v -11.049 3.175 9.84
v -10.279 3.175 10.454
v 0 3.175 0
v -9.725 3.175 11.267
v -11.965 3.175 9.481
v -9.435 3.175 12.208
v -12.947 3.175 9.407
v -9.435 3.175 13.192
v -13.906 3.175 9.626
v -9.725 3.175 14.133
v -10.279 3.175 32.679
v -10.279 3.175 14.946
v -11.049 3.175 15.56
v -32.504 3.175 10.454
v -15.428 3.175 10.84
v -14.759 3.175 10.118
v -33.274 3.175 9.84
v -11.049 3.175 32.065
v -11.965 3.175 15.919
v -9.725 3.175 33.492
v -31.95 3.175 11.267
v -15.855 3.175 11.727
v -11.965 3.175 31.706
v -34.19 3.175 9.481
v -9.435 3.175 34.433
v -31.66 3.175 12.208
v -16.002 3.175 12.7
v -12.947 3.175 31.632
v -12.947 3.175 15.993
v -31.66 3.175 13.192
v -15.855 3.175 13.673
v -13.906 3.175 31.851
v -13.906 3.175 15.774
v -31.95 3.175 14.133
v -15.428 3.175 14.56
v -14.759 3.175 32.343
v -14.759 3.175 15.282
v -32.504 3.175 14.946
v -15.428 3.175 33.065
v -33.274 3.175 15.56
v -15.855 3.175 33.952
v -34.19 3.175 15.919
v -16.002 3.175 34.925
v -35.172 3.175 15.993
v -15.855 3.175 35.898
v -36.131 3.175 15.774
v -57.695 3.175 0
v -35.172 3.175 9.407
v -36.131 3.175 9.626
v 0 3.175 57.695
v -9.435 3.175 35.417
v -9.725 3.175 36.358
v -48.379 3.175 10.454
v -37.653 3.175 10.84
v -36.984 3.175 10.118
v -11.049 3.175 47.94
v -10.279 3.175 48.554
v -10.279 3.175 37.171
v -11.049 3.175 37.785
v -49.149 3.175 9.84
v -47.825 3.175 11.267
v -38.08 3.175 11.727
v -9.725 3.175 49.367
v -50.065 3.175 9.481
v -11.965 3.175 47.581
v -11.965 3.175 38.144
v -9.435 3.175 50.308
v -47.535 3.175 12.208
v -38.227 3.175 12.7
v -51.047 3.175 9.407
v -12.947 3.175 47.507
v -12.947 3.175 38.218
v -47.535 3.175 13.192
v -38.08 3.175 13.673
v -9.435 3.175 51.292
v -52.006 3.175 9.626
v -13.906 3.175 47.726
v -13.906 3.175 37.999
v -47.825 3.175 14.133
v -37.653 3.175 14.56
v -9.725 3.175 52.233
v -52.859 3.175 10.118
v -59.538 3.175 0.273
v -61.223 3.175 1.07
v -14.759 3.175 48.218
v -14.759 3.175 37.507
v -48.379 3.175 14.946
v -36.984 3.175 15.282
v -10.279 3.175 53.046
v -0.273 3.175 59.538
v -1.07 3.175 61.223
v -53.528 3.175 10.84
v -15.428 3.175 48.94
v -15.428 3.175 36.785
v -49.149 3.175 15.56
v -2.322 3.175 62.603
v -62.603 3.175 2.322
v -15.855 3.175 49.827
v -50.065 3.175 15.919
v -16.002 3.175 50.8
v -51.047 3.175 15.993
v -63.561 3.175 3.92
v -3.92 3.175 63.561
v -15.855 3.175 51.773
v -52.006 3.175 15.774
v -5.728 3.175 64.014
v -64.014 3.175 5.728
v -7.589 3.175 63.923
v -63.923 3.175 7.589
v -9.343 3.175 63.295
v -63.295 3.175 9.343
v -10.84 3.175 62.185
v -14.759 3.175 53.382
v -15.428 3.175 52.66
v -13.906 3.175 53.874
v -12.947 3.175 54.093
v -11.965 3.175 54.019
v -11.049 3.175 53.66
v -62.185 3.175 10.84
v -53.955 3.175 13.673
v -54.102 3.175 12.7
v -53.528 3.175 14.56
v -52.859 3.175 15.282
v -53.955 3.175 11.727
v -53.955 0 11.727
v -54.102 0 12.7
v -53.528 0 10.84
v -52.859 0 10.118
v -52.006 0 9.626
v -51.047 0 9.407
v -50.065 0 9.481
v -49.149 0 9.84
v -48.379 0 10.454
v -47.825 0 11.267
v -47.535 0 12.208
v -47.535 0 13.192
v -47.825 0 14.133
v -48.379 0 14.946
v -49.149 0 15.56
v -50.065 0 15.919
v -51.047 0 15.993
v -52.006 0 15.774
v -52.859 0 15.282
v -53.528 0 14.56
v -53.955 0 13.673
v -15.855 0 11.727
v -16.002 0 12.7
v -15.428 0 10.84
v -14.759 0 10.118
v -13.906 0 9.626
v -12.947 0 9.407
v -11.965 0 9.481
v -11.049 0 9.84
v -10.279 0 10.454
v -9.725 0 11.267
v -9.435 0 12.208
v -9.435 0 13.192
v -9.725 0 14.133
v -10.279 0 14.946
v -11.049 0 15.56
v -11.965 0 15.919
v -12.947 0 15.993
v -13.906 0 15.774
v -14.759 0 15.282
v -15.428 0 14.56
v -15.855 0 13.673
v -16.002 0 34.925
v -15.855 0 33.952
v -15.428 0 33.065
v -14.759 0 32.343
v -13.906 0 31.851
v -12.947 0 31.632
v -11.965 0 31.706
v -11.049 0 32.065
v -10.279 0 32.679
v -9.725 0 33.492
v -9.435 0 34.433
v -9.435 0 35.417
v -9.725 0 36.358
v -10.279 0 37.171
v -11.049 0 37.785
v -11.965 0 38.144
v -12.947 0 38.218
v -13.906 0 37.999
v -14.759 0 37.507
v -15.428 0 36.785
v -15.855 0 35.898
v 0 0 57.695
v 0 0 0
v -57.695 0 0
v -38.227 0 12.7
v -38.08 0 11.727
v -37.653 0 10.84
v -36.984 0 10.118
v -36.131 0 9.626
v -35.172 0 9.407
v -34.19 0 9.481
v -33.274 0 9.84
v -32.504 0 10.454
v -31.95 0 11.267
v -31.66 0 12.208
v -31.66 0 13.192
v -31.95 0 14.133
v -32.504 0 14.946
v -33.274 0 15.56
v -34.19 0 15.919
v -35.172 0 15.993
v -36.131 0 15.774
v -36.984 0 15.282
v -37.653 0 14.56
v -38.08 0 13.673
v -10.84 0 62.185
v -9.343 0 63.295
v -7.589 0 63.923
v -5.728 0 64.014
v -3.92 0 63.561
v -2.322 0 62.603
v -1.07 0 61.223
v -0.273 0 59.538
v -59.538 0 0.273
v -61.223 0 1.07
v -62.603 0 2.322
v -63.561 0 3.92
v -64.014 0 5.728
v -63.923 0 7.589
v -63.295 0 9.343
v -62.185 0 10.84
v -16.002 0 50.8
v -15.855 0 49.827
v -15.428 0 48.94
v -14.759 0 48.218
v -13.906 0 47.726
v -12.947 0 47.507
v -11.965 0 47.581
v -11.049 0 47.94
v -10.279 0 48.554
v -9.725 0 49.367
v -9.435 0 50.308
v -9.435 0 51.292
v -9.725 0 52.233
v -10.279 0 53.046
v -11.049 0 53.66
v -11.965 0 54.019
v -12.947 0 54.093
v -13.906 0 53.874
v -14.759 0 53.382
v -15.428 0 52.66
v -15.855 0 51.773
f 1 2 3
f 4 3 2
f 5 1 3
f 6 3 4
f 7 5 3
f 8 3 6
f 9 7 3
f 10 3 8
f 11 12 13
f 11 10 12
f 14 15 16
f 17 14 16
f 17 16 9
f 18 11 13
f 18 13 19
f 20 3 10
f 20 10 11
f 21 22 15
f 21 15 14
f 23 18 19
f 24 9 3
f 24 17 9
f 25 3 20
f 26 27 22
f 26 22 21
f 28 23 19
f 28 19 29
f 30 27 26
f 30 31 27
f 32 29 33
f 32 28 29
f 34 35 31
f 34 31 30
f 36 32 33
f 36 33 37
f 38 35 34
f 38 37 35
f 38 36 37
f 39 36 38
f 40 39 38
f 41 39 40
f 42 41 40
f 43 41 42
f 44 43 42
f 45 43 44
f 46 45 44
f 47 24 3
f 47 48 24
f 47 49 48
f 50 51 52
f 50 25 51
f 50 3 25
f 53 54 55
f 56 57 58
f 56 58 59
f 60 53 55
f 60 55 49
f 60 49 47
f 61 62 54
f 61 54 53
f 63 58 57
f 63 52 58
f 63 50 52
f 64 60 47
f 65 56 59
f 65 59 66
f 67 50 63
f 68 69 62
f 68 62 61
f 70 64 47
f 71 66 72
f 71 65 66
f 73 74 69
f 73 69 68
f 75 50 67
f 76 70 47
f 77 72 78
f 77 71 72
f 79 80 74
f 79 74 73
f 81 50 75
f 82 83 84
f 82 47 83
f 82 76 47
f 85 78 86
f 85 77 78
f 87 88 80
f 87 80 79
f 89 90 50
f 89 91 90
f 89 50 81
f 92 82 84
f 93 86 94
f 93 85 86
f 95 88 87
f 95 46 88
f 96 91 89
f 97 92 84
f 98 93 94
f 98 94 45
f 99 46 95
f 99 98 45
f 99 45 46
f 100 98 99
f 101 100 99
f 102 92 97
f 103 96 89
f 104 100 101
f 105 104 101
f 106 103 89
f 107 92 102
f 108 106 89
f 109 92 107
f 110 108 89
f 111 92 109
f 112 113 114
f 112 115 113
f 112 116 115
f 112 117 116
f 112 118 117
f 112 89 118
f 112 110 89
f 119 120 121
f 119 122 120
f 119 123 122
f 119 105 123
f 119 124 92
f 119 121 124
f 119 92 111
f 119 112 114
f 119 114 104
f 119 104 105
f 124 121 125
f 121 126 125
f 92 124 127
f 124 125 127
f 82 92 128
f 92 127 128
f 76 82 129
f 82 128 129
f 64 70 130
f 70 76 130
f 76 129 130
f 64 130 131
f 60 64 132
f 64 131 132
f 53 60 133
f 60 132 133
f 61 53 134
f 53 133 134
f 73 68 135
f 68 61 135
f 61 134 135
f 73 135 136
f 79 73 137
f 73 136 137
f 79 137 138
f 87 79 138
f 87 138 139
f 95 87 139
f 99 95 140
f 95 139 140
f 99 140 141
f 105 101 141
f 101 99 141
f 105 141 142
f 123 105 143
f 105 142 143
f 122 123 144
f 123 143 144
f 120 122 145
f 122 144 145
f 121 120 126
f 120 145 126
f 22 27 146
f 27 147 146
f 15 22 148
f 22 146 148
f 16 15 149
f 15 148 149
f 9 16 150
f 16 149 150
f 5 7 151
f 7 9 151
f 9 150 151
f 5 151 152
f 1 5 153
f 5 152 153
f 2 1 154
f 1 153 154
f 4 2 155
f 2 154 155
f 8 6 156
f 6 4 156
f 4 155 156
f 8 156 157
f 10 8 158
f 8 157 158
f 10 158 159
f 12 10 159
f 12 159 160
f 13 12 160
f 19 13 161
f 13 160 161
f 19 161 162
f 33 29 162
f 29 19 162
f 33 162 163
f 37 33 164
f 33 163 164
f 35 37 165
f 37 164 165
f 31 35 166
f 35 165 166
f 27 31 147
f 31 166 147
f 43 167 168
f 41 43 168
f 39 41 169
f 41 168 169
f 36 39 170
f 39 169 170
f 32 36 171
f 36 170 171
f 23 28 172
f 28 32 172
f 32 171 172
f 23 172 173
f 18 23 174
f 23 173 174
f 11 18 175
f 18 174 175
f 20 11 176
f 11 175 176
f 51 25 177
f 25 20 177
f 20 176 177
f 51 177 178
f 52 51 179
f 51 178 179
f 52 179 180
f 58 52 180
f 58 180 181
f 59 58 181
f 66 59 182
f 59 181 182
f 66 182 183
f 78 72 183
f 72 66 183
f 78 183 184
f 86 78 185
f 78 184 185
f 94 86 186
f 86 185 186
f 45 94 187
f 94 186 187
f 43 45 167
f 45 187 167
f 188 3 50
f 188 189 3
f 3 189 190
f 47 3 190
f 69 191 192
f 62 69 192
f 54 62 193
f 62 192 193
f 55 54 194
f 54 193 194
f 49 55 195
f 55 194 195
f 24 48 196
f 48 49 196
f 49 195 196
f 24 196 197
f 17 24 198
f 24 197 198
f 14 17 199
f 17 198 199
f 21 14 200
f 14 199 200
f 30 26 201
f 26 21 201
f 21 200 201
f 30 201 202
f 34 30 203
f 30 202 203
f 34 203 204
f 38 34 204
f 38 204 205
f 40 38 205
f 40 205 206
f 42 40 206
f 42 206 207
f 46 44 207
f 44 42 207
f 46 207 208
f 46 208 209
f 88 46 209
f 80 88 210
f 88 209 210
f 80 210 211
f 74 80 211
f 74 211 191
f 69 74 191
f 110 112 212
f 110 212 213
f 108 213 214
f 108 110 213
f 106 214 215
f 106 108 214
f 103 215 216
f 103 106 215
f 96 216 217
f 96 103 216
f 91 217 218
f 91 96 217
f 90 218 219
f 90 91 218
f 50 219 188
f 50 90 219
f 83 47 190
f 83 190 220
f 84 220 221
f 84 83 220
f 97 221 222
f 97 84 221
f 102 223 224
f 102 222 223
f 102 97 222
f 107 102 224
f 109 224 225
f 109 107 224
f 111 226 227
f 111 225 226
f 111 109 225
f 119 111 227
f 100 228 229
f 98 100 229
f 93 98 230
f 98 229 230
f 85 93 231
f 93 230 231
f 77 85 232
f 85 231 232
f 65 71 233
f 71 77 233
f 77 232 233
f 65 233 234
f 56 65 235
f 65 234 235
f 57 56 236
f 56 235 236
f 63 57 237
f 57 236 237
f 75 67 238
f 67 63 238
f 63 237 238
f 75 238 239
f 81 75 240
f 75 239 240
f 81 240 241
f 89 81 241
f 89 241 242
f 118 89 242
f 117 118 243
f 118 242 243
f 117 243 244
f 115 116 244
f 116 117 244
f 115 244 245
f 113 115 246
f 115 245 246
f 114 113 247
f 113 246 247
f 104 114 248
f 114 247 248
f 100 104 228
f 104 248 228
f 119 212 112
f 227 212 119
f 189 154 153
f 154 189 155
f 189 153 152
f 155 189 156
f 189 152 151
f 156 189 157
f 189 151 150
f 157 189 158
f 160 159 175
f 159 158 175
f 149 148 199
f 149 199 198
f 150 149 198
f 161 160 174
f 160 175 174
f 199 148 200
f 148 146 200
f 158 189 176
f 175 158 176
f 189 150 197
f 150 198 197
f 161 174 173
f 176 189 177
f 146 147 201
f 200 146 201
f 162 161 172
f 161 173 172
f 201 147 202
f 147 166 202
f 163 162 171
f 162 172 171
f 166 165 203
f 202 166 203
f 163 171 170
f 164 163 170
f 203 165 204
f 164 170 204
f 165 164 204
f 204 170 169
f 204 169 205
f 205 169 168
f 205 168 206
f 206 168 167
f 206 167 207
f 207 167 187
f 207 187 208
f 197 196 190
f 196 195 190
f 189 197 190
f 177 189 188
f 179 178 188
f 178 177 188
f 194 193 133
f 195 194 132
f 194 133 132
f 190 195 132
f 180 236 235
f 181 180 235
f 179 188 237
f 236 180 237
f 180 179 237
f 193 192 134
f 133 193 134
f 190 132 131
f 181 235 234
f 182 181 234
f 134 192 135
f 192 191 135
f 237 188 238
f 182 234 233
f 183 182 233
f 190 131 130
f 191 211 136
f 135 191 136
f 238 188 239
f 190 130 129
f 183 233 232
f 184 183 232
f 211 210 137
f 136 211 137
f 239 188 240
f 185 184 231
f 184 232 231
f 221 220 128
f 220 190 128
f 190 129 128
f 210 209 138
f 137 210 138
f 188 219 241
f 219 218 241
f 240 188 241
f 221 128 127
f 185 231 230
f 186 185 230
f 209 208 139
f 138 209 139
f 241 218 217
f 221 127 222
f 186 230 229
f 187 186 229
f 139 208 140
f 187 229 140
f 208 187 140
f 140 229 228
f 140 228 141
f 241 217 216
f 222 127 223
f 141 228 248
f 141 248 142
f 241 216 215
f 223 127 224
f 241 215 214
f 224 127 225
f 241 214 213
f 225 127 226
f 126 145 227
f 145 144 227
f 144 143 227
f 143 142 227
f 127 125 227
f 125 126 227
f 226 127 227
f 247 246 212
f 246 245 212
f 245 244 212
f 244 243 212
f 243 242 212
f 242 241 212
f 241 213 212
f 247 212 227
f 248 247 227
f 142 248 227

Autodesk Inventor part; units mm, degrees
ref_plane "YZ Plane" through (0, 0, 0) normal (1, 0, 0) x (0, 1, 0)
ref_plane "XZ Plane" through (0, 0, 0) normal (0, 1, 0) x (-1, 0, 0)
ref_plane "XY Plane" through (0, 0, 0) normal (0, 0, 1) x (1, 0, 0)
sketch "Sketch1" plane through (0, 0, 0) normal (0, 1, 0) x (-1, 0, 0)
  line L0 (0, 0) -> (73.025, 0)
  line L1 (0, 0) -> (0, 73.025)
  line L2 (0, 73.025) -> (73.025, 0)
  line L3 (12.7, 0) -> (12.7, 60.325) construction
  line L4 (0, 12.7) -> (60.325, 12.7) construction
  circle A0 centre (12.7, 34.925) radius 3.302
  circle A1 centre (34.925, 12.7) radius 3.302
  circle A2 centre (50.8, 12.7) radius 3.302
  circle A3 centre (12.7, 50.8) radius 3.302
  circle A4 centre (12.7, 12.7) radius 3.302
  line L5 (0, 34.925) -> (38.1, 34.925) construction
  line L6 (34.925, 38.1) -> (34.925, 0) construction
  dimension "d0" = 73.025
  dimension "d1" = 73.025
  dimension "d2" = 12.7
  dimension "d3" = 12.7
  dimension "d4" = 6.604
  dimension "d5" = 6.604
  dimension "d6" = 6.604
  dimension "d7" = 6.604
  dimension "d8" = 15.875
  dimension "d9" = 15.875
  dimension "d10" = 6.604
  dimension "d14" = 34.925
  dimension "d15" = 34.925
extrude "Extrusion1" add sketch "Sketch1" along normal blind 3.175
fillet "Fillet1" radius 6.35 2 edges at (0, 1.5875, 73.025) (-73.025, 1.5875, 0)
equation "\"d0\" = d1"
equation "\"d2\" = d3"
equation "\"d4\" = d7"
equation "\"d5\" = d7"
equation "\"d6\" = d7"
equation "\"d9\" = d8"
equation "\"d10\" = d7"
equation "\"d15\" = d14"
properties part number "Chassis Corner Plate V1.500" material "Aluminum 6061"
